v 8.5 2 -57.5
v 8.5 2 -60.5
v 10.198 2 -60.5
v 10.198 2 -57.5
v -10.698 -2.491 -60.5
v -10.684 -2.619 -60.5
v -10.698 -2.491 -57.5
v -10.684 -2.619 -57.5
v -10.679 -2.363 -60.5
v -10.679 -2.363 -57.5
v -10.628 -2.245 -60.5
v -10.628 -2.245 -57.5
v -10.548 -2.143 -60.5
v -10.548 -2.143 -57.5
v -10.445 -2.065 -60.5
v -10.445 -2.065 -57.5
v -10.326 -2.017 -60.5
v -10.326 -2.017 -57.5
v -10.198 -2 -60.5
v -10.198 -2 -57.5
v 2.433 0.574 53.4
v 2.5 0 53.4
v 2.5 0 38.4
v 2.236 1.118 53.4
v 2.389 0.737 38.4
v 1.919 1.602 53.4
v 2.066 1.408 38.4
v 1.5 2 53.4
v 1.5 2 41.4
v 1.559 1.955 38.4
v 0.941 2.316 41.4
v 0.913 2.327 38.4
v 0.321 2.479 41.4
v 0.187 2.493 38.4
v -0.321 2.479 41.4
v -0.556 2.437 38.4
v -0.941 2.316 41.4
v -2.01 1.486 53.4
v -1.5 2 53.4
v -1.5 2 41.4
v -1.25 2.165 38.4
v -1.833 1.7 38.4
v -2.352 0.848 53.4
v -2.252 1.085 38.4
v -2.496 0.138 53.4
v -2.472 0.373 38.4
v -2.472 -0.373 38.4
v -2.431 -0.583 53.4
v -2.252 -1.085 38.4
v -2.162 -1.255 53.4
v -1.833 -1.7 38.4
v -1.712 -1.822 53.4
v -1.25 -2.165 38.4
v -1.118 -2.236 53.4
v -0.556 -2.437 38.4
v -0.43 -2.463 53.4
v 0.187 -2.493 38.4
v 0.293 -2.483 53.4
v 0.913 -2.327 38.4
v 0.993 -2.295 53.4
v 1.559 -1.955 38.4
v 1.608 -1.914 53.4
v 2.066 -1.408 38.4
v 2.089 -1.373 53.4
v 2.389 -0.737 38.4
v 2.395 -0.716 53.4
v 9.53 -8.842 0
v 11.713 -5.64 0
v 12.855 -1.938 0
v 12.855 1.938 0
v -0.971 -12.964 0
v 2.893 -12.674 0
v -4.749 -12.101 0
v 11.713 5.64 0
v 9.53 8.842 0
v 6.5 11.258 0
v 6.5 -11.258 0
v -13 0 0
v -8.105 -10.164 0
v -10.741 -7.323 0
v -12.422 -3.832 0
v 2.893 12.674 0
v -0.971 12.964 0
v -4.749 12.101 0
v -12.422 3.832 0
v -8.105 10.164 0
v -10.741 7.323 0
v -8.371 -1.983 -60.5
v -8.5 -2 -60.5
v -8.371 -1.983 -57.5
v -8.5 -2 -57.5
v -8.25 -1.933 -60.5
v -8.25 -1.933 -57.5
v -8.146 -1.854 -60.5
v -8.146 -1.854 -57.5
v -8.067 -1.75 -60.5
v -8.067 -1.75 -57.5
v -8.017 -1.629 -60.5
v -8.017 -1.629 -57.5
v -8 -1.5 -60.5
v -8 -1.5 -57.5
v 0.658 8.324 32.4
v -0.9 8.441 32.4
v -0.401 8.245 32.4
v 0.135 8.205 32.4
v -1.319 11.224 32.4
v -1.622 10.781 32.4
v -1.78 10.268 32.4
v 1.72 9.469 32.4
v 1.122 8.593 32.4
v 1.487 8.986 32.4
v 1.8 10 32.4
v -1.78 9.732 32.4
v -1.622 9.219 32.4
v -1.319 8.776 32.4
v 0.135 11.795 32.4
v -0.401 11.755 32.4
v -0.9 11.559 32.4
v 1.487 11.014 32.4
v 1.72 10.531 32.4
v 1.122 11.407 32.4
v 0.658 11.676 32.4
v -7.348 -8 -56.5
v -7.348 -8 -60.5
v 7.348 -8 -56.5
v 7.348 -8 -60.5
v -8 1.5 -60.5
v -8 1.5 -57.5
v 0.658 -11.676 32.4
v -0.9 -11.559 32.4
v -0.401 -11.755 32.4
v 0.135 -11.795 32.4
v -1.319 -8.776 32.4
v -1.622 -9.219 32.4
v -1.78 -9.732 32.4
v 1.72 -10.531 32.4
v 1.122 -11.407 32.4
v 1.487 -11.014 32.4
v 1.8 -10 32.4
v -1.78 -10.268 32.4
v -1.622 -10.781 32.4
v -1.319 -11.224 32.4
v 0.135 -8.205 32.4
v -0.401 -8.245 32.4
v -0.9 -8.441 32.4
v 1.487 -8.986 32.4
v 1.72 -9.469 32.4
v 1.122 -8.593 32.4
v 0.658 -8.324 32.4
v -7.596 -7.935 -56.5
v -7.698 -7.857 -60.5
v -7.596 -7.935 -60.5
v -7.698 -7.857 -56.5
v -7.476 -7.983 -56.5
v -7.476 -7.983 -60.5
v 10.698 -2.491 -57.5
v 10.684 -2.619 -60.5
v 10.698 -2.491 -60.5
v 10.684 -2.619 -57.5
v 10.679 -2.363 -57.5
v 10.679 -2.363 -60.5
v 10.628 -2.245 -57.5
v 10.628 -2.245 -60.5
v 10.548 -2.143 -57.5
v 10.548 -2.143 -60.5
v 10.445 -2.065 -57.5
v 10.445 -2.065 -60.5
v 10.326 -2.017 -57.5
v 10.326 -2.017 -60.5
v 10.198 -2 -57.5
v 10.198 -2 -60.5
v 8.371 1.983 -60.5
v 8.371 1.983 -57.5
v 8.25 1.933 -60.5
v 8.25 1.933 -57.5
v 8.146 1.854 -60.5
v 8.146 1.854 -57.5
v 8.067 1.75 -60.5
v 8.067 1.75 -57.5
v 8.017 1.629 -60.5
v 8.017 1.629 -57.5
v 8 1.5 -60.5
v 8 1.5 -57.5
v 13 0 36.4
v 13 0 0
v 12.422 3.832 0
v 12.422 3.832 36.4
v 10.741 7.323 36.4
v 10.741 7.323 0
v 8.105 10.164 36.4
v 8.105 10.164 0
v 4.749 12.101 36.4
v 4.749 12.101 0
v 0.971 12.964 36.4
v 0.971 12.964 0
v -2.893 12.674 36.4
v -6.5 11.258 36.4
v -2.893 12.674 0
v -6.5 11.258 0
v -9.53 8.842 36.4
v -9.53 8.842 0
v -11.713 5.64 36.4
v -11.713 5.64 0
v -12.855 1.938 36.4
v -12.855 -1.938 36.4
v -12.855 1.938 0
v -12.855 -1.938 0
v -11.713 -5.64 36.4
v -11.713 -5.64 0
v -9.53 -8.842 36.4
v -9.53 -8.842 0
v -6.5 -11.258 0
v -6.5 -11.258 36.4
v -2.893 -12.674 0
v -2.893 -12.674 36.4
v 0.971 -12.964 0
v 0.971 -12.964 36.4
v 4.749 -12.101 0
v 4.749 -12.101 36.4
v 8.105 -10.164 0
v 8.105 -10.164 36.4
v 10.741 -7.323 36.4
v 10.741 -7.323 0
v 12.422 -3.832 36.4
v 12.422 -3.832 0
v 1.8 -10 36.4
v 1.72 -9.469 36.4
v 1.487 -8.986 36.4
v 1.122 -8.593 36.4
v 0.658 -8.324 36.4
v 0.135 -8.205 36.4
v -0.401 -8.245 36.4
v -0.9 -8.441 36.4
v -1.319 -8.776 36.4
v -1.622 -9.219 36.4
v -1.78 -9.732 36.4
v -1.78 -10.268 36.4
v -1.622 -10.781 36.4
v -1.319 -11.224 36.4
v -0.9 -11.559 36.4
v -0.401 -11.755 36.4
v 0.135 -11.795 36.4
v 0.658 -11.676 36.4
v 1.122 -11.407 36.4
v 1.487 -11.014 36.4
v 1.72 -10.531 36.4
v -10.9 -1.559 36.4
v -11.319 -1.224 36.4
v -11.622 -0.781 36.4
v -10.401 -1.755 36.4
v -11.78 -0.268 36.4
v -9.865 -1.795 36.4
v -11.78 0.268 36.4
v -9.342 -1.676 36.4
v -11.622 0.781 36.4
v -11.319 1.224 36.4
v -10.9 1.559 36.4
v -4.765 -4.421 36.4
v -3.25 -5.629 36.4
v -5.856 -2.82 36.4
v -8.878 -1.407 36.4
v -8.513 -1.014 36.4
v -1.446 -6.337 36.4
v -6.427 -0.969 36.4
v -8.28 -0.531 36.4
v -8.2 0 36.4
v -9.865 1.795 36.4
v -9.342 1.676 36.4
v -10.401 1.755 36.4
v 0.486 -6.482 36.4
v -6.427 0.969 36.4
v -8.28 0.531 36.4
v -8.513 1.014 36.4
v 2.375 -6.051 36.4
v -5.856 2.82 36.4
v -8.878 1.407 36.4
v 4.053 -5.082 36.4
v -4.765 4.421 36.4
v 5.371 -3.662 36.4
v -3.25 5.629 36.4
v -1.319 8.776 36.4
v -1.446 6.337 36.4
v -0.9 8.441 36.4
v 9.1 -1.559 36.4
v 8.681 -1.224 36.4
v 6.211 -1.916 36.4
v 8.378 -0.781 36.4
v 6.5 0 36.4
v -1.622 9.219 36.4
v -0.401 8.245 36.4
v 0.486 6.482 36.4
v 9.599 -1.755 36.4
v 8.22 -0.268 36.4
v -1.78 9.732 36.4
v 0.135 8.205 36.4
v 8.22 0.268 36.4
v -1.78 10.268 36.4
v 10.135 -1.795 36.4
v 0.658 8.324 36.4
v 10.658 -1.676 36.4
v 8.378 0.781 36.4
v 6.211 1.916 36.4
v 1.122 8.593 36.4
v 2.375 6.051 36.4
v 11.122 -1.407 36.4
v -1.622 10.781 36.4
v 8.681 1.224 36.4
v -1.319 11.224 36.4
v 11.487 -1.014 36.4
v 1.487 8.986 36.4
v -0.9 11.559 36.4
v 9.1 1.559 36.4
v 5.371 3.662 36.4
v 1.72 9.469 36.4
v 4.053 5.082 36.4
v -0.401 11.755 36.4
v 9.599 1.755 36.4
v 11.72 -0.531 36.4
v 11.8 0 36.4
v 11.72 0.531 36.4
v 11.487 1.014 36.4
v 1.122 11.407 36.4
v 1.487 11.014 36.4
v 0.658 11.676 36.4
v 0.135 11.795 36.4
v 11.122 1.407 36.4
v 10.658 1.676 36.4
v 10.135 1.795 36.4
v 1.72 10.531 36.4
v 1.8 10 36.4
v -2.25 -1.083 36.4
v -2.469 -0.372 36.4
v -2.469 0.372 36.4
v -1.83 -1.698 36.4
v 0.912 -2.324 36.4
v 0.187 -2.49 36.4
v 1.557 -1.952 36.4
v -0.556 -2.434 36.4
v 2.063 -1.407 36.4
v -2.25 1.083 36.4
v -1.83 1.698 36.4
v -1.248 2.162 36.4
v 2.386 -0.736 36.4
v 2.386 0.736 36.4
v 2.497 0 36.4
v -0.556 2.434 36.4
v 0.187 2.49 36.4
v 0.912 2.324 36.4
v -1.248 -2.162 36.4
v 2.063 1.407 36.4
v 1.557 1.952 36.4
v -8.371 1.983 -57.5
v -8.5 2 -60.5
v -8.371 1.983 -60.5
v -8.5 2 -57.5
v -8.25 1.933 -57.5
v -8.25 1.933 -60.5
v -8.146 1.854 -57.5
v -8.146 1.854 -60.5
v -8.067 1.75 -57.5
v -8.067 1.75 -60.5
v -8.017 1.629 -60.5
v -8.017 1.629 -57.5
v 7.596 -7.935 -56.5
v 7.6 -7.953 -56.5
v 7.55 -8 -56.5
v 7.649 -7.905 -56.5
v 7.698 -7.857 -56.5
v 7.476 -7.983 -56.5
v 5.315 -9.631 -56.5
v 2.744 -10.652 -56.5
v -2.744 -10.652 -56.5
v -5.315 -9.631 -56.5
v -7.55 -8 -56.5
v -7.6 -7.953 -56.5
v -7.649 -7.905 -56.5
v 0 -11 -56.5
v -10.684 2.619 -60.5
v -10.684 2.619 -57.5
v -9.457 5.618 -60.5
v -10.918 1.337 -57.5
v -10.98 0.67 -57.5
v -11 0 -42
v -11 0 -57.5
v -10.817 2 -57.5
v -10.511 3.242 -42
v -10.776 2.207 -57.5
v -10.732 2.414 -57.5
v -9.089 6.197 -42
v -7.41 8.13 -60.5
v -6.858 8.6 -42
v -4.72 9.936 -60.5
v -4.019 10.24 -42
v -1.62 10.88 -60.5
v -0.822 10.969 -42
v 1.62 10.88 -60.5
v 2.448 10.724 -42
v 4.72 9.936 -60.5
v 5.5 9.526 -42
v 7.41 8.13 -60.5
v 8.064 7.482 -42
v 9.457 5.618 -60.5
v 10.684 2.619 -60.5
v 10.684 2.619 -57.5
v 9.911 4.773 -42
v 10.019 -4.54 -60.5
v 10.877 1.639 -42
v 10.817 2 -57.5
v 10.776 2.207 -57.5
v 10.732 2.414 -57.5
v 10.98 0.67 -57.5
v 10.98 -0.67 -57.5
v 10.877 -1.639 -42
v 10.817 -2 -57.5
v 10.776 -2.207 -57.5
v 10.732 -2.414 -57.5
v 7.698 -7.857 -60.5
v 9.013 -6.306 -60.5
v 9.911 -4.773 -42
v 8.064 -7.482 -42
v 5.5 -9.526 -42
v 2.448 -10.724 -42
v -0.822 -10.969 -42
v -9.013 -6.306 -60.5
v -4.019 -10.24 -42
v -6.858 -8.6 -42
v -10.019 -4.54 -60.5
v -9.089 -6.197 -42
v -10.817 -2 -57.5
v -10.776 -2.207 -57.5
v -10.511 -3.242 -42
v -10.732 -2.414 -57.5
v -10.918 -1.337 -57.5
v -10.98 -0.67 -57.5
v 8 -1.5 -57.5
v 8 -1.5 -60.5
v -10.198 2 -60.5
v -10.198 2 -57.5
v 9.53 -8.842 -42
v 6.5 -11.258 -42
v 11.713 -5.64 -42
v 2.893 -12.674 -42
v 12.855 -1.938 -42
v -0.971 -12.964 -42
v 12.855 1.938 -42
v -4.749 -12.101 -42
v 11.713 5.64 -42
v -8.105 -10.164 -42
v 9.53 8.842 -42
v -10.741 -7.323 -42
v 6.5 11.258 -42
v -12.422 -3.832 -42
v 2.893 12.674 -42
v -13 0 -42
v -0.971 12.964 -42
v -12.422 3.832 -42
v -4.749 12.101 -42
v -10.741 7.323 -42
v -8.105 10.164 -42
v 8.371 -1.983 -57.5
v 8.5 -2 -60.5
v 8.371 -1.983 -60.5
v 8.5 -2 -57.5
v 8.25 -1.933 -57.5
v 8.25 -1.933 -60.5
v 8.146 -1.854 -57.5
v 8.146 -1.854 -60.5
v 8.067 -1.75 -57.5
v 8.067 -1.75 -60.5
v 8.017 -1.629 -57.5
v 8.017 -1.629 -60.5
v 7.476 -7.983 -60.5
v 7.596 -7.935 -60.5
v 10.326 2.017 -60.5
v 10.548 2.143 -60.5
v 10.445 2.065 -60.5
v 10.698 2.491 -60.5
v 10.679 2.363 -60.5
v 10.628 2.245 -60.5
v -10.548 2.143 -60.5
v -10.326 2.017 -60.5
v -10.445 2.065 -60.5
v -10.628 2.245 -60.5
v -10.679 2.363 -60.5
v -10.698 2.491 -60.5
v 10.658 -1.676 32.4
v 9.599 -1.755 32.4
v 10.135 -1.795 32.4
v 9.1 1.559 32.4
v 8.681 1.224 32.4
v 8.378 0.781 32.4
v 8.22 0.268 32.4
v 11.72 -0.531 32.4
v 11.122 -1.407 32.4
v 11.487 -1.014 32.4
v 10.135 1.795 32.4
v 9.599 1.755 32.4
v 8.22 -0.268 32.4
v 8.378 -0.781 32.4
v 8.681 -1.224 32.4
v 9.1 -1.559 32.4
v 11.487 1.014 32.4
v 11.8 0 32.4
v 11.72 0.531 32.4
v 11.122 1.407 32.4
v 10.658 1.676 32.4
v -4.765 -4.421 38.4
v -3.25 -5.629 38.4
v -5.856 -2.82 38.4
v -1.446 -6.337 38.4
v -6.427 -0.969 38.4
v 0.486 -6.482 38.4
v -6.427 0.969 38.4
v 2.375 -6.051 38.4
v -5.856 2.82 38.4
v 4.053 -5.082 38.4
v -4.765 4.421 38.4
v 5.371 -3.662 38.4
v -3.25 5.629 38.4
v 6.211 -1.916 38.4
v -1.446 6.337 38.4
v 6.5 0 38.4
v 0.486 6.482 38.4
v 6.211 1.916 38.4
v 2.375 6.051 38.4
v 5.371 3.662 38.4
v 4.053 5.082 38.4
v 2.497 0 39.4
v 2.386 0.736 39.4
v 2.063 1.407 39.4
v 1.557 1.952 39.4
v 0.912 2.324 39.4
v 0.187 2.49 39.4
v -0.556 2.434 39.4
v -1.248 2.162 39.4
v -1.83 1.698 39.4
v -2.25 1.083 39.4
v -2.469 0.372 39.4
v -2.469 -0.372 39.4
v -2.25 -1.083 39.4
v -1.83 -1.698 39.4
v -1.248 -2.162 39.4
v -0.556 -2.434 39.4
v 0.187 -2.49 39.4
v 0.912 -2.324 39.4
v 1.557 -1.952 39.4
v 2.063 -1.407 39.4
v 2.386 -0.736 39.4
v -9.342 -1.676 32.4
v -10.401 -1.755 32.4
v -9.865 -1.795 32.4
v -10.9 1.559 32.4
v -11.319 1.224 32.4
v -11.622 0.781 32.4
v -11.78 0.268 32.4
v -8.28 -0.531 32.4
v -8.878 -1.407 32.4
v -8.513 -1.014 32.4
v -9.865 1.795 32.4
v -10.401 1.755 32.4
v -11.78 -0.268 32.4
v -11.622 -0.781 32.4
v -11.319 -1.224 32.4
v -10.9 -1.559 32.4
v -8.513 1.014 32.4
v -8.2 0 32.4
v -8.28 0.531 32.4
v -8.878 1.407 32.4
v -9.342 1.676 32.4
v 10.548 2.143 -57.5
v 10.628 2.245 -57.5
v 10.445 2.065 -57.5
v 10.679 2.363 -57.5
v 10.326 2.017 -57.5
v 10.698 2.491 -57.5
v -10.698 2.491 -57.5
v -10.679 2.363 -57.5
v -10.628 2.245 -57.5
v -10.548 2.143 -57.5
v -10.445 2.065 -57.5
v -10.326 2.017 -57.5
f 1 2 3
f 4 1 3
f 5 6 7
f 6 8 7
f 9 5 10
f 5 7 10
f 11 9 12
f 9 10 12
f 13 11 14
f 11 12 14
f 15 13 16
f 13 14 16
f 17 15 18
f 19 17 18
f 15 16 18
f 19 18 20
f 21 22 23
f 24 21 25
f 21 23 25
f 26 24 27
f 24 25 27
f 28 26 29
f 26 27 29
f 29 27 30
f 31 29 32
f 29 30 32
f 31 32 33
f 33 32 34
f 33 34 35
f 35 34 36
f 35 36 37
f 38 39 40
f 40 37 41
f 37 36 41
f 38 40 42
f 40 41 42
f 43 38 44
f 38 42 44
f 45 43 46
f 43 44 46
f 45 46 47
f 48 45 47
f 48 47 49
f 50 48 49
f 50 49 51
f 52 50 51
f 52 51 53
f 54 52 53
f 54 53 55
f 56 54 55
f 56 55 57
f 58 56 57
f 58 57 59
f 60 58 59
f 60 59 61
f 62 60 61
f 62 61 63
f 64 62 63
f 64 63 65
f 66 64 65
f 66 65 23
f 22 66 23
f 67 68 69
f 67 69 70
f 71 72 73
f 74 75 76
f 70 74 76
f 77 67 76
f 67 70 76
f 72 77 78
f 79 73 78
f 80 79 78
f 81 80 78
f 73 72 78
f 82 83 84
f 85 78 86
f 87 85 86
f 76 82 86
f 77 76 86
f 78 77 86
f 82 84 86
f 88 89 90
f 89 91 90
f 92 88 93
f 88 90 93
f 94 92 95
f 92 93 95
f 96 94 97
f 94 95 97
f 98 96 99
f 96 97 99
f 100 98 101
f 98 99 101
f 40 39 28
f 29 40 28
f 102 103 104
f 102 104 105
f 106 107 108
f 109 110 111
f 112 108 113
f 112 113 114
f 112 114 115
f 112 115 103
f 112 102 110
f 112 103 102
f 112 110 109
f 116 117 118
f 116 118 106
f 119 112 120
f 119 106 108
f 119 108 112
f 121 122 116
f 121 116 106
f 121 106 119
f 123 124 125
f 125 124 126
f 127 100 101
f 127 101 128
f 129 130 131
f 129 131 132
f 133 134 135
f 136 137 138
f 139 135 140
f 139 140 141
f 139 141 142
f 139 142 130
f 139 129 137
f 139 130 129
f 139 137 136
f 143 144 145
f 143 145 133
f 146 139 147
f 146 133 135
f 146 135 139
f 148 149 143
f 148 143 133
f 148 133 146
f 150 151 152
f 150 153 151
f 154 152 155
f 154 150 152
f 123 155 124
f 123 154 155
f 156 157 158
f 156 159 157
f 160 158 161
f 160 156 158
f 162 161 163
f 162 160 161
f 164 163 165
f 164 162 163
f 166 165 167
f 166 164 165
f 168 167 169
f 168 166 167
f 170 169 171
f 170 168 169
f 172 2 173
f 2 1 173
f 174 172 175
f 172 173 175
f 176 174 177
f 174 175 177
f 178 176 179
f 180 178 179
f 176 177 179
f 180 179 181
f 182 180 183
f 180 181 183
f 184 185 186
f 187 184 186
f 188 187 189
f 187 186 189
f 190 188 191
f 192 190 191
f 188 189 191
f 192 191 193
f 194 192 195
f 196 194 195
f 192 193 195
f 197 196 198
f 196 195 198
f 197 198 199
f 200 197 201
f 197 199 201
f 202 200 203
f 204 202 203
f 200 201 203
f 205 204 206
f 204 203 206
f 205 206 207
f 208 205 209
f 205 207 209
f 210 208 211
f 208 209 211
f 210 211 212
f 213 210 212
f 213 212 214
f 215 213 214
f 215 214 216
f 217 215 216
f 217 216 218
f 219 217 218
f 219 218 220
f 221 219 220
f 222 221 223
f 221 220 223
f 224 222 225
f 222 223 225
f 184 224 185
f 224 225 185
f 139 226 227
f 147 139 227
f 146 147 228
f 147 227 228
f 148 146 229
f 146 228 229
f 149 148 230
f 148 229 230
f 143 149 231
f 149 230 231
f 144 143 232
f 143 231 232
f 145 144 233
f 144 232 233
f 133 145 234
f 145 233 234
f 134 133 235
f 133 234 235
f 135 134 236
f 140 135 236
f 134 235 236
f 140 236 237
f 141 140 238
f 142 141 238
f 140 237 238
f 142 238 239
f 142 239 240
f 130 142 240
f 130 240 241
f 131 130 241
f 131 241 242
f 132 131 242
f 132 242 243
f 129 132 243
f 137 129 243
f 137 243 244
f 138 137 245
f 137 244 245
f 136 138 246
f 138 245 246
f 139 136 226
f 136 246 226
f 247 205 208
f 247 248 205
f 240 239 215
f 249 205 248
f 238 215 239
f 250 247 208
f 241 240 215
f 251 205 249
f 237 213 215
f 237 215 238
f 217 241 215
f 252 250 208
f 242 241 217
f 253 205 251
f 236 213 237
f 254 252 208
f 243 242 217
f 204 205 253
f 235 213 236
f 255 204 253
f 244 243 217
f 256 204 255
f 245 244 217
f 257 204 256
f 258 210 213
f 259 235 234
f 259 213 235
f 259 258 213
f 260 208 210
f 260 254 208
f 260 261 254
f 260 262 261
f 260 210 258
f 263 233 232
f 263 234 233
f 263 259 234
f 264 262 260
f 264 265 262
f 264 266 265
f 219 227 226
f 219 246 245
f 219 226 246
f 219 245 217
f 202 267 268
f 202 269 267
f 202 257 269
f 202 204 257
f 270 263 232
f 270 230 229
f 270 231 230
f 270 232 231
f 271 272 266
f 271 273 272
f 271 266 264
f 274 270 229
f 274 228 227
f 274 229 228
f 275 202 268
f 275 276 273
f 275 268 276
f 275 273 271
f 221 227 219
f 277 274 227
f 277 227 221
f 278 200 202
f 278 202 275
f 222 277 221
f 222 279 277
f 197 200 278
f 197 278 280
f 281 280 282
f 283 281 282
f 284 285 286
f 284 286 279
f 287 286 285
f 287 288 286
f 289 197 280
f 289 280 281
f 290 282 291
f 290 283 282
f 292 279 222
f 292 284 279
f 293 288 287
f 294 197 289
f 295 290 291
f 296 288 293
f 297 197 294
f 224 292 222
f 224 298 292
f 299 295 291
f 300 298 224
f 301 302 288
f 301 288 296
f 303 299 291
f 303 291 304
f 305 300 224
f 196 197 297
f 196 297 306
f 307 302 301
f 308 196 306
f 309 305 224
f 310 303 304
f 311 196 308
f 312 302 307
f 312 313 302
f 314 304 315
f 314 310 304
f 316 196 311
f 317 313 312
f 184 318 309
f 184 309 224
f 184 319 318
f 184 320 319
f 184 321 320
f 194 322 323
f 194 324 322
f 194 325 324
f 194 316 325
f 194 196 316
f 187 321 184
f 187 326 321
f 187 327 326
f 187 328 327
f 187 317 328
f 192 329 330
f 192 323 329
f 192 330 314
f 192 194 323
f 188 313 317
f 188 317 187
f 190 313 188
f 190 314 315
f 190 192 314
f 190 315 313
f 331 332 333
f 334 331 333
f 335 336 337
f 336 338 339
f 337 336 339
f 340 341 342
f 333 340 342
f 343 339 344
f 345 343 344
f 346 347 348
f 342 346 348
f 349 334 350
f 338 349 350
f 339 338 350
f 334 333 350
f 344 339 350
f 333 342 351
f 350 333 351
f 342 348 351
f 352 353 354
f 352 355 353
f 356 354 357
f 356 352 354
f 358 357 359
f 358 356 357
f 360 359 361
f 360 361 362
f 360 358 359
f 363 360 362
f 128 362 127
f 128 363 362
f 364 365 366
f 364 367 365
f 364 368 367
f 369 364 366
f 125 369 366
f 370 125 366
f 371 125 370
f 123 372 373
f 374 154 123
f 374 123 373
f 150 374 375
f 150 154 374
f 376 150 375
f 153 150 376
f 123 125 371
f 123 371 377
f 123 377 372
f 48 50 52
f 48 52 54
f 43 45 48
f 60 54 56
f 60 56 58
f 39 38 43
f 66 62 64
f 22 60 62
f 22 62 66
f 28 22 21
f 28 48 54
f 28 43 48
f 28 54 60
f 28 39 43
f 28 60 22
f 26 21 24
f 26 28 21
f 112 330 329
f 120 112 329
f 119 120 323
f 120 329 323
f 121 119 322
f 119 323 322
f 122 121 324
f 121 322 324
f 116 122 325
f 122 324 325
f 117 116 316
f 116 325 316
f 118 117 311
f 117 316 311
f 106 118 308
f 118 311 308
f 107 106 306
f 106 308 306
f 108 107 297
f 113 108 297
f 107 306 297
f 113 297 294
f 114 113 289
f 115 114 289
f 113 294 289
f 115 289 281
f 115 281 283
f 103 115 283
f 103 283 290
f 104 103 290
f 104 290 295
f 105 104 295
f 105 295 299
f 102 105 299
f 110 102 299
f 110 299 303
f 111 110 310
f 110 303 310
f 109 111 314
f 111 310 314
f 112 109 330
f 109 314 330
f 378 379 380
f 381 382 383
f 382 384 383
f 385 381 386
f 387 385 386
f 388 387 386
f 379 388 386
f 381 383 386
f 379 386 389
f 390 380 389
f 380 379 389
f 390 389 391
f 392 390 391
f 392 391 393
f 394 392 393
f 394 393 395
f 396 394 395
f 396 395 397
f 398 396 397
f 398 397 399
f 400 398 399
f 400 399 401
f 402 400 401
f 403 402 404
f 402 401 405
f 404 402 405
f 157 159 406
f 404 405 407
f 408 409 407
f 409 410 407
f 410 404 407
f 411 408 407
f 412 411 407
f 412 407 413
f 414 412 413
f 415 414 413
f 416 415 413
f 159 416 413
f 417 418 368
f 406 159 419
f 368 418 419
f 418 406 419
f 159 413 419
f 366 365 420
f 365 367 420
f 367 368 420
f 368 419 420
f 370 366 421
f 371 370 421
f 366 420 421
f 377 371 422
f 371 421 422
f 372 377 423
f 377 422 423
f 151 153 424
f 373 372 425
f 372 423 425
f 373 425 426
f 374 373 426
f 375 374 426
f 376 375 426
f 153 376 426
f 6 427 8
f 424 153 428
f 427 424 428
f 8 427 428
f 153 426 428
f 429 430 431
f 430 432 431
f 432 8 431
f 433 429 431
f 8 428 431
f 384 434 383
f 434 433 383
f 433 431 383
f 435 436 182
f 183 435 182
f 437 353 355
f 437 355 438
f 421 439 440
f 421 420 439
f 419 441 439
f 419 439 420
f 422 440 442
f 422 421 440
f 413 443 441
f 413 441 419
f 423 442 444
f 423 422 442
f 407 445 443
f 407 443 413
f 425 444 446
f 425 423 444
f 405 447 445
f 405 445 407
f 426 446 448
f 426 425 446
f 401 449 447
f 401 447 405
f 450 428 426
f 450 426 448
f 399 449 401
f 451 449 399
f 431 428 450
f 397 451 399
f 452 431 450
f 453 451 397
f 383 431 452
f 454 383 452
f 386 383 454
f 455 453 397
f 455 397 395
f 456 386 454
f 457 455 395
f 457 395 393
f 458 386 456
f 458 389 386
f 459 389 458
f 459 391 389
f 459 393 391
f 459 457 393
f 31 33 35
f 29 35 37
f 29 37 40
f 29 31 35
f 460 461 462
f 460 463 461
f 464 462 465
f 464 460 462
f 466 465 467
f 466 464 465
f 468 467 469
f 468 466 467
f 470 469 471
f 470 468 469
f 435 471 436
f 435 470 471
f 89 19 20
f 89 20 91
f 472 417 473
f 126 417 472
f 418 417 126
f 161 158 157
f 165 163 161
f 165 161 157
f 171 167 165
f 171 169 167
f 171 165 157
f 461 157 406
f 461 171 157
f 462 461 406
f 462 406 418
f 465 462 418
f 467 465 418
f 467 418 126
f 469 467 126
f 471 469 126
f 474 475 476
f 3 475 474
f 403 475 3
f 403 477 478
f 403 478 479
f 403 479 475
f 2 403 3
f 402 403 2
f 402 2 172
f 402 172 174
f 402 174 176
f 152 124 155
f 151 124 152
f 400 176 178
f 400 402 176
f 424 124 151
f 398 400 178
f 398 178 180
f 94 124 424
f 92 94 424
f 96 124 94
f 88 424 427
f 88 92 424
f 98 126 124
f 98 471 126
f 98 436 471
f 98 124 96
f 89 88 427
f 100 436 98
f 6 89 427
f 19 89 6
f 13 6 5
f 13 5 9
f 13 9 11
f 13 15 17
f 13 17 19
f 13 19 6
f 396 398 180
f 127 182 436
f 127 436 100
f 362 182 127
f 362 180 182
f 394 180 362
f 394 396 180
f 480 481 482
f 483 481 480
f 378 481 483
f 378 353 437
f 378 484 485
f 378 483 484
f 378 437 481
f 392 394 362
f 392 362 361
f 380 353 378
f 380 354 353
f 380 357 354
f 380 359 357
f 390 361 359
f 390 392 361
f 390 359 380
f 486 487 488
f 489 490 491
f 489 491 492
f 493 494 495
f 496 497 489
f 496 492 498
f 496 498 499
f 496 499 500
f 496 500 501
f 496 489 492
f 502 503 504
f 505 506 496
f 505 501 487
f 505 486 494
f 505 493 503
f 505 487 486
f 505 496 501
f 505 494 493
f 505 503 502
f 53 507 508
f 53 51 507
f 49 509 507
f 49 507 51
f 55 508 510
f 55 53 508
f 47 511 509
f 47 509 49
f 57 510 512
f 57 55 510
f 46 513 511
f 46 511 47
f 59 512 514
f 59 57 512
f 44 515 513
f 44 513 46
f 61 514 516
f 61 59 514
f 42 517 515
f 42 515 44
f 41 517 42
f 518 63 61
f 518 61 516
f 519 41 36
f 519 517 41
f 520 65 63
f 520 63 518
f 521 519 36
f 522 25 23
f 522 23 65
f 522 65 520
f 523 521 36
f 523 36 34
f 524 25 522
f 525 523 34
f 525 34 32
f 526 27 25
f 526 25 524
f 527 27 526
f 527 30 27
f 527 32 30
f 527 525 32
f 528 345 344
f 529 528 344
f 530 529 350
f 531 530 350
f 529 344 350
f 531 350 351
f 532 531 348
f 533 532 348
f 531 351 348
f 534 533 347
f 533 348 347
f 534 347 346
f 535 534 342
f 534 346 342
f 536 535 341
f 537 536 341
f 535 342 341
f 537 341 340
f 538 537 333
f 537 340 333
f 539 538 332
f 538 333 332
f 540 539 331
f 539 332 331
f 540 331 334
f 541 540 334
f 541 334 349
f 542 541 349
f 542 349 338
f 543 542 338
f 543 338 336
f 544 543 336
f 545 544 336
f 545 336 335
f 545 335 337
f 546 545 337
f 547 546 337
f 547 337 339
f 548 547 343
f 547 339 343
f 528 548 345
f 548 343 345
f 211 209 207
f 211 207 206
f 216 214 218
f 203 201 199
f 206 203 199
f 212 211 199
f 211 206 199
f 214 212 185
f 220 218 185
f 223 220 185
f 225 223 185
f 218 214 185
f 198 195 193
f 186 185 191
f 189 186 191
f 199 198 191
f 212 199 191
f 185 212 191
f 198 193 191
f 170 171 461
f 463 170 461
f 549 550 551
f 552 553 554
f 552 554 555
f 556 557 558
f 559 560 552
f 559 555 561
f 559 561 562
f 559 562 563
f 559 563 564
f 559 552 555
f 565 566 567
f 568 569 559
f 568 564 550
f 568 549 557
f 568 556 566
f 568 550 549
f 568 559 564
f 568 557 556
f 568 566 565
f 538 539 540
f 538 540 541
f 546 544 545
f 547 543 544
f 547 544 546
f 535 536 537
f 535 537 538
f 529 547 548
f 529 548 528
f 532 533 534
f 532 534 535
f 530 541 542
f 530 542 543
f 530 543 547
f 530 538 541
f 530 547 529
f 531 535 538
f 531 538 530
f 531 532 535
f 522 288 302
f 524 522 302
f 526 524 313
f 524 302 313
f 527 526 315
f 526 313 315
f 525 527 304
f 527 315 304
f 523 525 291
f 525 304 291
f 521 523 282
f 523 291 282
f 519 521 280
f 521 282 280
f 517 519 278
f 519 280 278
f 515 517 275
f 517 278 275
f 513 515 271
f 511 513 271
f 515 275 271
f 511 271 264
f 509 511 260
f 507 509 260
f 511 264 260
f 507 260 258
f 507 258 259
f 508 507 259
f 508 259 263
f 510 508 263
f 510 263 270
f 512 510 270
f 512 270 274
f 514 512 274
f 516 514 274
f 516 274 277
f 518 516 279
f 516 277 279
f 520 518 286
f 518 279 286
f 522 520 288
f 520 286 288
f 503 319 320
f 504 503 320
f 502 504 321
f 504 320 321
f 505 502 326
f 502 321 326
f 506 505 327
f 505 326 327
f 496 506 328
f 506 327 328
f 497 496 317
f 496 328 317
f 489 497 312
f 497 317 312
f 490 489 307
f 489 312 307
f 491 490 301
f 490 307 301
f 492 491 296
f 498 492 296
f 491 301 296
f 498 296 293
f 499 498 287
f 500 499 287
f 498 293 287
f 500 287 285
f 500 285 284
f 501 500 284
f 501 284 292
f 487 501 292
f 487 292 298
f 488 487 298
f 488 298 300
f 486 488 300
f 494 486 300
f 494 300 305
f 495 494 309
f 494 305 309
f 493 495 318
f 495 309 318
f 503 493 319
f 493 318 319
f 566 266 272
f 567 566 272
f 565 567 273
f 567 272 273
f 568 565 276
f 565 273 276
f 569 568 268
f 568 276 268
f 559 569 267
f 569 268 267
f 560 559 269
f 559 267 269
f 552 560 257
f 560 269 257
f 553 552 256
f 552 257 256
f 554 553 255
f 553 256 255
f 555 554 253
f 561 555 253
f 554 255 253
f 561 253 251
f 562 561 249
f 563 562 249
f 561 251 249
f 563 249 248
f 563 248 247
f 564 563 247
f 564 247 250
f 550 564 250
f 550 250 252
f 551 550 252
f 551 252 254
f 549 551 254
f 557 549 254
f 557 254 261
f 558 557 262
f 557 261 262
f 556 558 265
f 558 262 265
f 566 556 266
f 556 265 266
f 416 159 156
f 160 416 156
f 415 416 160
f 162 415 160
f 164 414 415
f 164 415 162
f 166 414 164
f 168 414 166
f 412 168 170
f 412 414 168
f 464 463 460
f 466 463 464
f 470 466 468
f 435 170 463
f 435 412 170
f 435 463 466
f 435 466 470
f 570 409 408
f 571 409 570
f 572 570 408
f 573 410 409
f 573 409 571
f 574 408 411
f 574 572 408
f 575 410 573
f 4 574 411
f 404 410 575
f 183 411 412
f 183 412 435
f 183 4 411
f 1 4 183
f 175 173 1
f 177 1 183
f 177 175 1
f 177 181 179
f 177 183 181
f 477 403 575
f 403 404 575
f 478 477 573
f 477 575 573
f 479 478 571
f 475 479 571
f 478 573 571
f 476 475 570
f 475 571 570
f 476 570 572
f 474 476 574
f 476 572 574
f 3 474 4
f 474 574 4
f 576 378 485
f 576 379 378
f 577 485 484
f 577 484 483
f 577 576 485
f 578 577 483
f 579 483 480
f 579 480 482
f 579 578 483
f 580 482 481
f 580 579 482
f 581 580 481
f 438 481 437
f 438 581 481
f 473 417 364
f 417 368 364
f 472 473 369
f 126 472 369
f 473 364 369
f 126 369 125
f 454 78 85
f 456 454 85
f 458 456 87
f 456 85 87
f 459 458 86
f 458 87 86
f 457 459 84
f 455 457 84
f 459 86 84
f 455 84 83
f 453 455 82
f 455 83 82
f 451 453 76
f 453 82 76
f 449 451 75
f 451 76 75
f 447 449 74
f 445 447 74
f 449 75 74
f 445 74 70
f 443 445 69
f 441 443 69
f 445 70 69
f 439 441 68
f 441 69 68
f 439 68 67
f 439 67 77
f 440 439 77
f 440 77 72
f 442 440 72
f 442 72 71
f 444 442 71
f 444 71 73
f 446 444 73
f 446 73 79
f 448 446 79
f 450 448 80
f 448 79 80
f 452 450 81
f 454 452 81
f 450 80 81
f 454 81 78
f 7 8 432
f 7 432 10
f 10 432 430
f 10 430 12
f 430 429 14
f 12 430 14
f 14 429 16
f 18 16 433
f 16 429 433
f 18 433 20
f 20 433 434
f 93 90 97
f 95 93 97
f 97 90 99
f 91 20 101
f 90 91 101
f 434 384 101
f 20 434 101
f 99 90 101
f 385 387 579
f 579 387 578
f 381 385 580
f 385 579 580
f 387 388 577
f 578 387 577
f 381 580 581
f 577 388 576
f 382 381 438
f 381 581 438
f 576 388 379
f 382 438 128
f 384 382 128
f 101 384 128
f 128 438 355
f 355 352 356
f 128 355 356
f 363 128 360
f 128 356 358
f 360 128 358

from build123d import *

# Parameters (mm, degrees)
ESQUISSE1_R                = 13
BOSS_EXTRU_REDUCTEUR_DEPTH = 36.4
ESQUISSE2_R                = 2.5
BOSS_EXTRU_ARBRE_DEPTH     = 17
ESQUISSE4_R                = 6.5
ESQUISSE4_R_2              = 2.5
BOSS_EXTRU_3_DEPTH         = 2
ESQUISSE5_R                = 1.8
ENL_V_MAT_EXTRU_2_DEPTH    = 4
ENL_V_START                = -12
ENL_V_MAT_EXTRU_3_DEPTH    = 12
ESQUISSE7_R                = 2.496805343
BOSS_EXTRU_4_DEPTH         = 3
ESQUISSE9_R                = 13
BOSS_EXTRU_5_DEPTH         = 42
ESQUISSE10_R               = 11
BOSS_EXTRU_6_DEPTH         = 18.5
ENL_V_MAT_EXTRU_5_DEPTH    = 4
ENL_V_MAT_EXTRU_6_DEPTH    = 3
CONG_1_R                   = 0.5


with BuildPart() as part:
    # Esquisse1 → Boss.-Extru. Reducteur (new body)
    with BuildSketch(Plane.XY):
        Circle(ESQUISSE1_R)
    extrude(amount=BOSS_EXTRU_REDUCTEUR_DEPTH)

    # Esquisse2 → Boss.-Extru. Arbre (add)
    with BuildSketch(Plane.XY.offset(36.4)):
        Circle(ESQUISSE2_R)
    extrude(amount=BOSS_EXTRU_ARBRE_DEPTH)

    # Esquisse4 → Boss.-Extru.3 (add)
    with BuildSketch(Plane.XY.offset(36.4)):
        Circle(ESQUISSE4_R)
        Circle(ESQUISSE4_R_2, mode=Mode.SUBTRACT)
    extrude(amount=BOSS_EXTRU_3_DEPTH)

    # Esquisse5 → Enl_v. mat.-Extru.2 (cut)
    with BuildSketch(Plane.XY.offset(36.4)):
        with Locations((0, 10)):
            Circle(ESQUISSE5_R)
        with Locations((-10, 0)):
            Circle(ESQUISSE5_R)
        with Locations((0, -10)):
            Circle(ESQUISSE5_R)
        with Locations((10, 0)):
            Circle(ESQUISSE5_R)
    extrude(amount=-ENL_V_MAT_EXTRU_2_DEPTH, mode=Mode.SUBTRACT)

    # Esquisse6 → Enl_v. mat.-Extru.3 (cut)
    with BuildSketch(Plane.XY.offset(53.4).offset(ENL_V_START)):
        with BuildLine():
            Line((0, 2), (1.5, 2))
            ThreePointArc((1.5, 2), (0, 2.5), (-1.5, 2))
            Line((-1.5, 2), (0, 2))
        make_face()
    extrude(amount=ENL_V_MAT_EXTRU_3_DEPTH, mode=Mode.SUBTRACT)


with BuildPart() as body_2:
    # Esquisse7 → Boss.-Extru.4 (new body)
    with BuildSketch(Plane.XY.offset(36.4)):
        Circle(ESQUISSE7_R)
    extrude(amount=BOSS_EXTRU_4_DEPTH)


with BuildPart() as body_3:
    # Esquisse9 → Boss.-Extru.5 (new body)
    with BuildSketch(Plane(origin=(0, 0, 0), x_dir=(-1, 0, 0), z_dir=(0, 0, -1))):
        Circle(ESQUISSE9_R)
    extrude(amount=BOSS_EXTRU_5_DEPTH)

    # Esquisse10 → Boss.-Extru.6 (add)
    with BuildSketch(Plane(origin=(0, 0, -42), x_dir=(-1, 0, 0), z_dir=(0, 0, -1))):
        Circle(ESQUISSE10_R)
    extrude(amount=BOSS_EXTRU_6_DEPTH)

    # Esquisse12 → Enl_v. mat.-Extru.5 (cut)
    with BuildSketch(Plane(origin=(0, 0, -60.5), x_dir=(-1, 0, 0), z_dir=(0, 0, -1))):
        with BuildLine():
            Line((7.549834435, -8), (0, -8))
            Line((0, -8), (-7.549834435, -8))
            ThreePointArc((-7.549834435, -8), (0, -11), (7.549834435, -8))
        make_face()
    extrude(amount=-ENL_V_MAT_EXTRU_5_DEPTH, mode=Mode.SUBTRACT)

    # Esquisse12_4 → Enl_v. mat.-Extru.6 (cut)
    with BuildSketch(Plane(origin=(0, 0, -60.5), x_dir=(-1, 0, 0), z_dir=(0, 0, -1))):
        with BuildLine():
            ThreePointArc((-10.816653826, 2), (-11, 0), (-10.816653826, -2))
            Line((-10.816653826, -2), (-8, -2))
            Line((-8, -2), (-8, 0))
            Line((-8, 0), (-8, 2))
            Line((-8, 2), (-10.816653826, 2))
        make_face()
    enl_v_mat_extru_6 = extrude(amount=-ENL_V_MAT_EXTRU_6_DEPTH, mode=Mode.SUBTRACT)

    # Sym_trie1: Enl_v. mat.-Extru.6 across plane
    add(enl_v_mat_extru_6.mirror(Plane(origin=(0, 0, 0), x_dir=(0, 0, 1), z_dir=(1, 0, 0))), mode=Mode.SUBTRACT)

    # Cong_1
    cong_1_edges = [body_3.edges().sort_by_distance(p)[0] for p in [
        (7.549834435, -8, -58.5),
        (-7.549834435, -8, -58.5),
        (-10.816653826, 2, -59),
        (-10.816653826, -2, -59),
        (-8, 2, -59),
        (-8, -2, -59),
        (8, -2, -59),
        (8, 2, -59),
        (10.816653826, -2, -59),
        (10.816653826, 2, -59),
    ]]
    fillet(cong_1_edges, radius=CONG_1_R)


solid = Compound([part.part, body_2.part, body_3.part])
